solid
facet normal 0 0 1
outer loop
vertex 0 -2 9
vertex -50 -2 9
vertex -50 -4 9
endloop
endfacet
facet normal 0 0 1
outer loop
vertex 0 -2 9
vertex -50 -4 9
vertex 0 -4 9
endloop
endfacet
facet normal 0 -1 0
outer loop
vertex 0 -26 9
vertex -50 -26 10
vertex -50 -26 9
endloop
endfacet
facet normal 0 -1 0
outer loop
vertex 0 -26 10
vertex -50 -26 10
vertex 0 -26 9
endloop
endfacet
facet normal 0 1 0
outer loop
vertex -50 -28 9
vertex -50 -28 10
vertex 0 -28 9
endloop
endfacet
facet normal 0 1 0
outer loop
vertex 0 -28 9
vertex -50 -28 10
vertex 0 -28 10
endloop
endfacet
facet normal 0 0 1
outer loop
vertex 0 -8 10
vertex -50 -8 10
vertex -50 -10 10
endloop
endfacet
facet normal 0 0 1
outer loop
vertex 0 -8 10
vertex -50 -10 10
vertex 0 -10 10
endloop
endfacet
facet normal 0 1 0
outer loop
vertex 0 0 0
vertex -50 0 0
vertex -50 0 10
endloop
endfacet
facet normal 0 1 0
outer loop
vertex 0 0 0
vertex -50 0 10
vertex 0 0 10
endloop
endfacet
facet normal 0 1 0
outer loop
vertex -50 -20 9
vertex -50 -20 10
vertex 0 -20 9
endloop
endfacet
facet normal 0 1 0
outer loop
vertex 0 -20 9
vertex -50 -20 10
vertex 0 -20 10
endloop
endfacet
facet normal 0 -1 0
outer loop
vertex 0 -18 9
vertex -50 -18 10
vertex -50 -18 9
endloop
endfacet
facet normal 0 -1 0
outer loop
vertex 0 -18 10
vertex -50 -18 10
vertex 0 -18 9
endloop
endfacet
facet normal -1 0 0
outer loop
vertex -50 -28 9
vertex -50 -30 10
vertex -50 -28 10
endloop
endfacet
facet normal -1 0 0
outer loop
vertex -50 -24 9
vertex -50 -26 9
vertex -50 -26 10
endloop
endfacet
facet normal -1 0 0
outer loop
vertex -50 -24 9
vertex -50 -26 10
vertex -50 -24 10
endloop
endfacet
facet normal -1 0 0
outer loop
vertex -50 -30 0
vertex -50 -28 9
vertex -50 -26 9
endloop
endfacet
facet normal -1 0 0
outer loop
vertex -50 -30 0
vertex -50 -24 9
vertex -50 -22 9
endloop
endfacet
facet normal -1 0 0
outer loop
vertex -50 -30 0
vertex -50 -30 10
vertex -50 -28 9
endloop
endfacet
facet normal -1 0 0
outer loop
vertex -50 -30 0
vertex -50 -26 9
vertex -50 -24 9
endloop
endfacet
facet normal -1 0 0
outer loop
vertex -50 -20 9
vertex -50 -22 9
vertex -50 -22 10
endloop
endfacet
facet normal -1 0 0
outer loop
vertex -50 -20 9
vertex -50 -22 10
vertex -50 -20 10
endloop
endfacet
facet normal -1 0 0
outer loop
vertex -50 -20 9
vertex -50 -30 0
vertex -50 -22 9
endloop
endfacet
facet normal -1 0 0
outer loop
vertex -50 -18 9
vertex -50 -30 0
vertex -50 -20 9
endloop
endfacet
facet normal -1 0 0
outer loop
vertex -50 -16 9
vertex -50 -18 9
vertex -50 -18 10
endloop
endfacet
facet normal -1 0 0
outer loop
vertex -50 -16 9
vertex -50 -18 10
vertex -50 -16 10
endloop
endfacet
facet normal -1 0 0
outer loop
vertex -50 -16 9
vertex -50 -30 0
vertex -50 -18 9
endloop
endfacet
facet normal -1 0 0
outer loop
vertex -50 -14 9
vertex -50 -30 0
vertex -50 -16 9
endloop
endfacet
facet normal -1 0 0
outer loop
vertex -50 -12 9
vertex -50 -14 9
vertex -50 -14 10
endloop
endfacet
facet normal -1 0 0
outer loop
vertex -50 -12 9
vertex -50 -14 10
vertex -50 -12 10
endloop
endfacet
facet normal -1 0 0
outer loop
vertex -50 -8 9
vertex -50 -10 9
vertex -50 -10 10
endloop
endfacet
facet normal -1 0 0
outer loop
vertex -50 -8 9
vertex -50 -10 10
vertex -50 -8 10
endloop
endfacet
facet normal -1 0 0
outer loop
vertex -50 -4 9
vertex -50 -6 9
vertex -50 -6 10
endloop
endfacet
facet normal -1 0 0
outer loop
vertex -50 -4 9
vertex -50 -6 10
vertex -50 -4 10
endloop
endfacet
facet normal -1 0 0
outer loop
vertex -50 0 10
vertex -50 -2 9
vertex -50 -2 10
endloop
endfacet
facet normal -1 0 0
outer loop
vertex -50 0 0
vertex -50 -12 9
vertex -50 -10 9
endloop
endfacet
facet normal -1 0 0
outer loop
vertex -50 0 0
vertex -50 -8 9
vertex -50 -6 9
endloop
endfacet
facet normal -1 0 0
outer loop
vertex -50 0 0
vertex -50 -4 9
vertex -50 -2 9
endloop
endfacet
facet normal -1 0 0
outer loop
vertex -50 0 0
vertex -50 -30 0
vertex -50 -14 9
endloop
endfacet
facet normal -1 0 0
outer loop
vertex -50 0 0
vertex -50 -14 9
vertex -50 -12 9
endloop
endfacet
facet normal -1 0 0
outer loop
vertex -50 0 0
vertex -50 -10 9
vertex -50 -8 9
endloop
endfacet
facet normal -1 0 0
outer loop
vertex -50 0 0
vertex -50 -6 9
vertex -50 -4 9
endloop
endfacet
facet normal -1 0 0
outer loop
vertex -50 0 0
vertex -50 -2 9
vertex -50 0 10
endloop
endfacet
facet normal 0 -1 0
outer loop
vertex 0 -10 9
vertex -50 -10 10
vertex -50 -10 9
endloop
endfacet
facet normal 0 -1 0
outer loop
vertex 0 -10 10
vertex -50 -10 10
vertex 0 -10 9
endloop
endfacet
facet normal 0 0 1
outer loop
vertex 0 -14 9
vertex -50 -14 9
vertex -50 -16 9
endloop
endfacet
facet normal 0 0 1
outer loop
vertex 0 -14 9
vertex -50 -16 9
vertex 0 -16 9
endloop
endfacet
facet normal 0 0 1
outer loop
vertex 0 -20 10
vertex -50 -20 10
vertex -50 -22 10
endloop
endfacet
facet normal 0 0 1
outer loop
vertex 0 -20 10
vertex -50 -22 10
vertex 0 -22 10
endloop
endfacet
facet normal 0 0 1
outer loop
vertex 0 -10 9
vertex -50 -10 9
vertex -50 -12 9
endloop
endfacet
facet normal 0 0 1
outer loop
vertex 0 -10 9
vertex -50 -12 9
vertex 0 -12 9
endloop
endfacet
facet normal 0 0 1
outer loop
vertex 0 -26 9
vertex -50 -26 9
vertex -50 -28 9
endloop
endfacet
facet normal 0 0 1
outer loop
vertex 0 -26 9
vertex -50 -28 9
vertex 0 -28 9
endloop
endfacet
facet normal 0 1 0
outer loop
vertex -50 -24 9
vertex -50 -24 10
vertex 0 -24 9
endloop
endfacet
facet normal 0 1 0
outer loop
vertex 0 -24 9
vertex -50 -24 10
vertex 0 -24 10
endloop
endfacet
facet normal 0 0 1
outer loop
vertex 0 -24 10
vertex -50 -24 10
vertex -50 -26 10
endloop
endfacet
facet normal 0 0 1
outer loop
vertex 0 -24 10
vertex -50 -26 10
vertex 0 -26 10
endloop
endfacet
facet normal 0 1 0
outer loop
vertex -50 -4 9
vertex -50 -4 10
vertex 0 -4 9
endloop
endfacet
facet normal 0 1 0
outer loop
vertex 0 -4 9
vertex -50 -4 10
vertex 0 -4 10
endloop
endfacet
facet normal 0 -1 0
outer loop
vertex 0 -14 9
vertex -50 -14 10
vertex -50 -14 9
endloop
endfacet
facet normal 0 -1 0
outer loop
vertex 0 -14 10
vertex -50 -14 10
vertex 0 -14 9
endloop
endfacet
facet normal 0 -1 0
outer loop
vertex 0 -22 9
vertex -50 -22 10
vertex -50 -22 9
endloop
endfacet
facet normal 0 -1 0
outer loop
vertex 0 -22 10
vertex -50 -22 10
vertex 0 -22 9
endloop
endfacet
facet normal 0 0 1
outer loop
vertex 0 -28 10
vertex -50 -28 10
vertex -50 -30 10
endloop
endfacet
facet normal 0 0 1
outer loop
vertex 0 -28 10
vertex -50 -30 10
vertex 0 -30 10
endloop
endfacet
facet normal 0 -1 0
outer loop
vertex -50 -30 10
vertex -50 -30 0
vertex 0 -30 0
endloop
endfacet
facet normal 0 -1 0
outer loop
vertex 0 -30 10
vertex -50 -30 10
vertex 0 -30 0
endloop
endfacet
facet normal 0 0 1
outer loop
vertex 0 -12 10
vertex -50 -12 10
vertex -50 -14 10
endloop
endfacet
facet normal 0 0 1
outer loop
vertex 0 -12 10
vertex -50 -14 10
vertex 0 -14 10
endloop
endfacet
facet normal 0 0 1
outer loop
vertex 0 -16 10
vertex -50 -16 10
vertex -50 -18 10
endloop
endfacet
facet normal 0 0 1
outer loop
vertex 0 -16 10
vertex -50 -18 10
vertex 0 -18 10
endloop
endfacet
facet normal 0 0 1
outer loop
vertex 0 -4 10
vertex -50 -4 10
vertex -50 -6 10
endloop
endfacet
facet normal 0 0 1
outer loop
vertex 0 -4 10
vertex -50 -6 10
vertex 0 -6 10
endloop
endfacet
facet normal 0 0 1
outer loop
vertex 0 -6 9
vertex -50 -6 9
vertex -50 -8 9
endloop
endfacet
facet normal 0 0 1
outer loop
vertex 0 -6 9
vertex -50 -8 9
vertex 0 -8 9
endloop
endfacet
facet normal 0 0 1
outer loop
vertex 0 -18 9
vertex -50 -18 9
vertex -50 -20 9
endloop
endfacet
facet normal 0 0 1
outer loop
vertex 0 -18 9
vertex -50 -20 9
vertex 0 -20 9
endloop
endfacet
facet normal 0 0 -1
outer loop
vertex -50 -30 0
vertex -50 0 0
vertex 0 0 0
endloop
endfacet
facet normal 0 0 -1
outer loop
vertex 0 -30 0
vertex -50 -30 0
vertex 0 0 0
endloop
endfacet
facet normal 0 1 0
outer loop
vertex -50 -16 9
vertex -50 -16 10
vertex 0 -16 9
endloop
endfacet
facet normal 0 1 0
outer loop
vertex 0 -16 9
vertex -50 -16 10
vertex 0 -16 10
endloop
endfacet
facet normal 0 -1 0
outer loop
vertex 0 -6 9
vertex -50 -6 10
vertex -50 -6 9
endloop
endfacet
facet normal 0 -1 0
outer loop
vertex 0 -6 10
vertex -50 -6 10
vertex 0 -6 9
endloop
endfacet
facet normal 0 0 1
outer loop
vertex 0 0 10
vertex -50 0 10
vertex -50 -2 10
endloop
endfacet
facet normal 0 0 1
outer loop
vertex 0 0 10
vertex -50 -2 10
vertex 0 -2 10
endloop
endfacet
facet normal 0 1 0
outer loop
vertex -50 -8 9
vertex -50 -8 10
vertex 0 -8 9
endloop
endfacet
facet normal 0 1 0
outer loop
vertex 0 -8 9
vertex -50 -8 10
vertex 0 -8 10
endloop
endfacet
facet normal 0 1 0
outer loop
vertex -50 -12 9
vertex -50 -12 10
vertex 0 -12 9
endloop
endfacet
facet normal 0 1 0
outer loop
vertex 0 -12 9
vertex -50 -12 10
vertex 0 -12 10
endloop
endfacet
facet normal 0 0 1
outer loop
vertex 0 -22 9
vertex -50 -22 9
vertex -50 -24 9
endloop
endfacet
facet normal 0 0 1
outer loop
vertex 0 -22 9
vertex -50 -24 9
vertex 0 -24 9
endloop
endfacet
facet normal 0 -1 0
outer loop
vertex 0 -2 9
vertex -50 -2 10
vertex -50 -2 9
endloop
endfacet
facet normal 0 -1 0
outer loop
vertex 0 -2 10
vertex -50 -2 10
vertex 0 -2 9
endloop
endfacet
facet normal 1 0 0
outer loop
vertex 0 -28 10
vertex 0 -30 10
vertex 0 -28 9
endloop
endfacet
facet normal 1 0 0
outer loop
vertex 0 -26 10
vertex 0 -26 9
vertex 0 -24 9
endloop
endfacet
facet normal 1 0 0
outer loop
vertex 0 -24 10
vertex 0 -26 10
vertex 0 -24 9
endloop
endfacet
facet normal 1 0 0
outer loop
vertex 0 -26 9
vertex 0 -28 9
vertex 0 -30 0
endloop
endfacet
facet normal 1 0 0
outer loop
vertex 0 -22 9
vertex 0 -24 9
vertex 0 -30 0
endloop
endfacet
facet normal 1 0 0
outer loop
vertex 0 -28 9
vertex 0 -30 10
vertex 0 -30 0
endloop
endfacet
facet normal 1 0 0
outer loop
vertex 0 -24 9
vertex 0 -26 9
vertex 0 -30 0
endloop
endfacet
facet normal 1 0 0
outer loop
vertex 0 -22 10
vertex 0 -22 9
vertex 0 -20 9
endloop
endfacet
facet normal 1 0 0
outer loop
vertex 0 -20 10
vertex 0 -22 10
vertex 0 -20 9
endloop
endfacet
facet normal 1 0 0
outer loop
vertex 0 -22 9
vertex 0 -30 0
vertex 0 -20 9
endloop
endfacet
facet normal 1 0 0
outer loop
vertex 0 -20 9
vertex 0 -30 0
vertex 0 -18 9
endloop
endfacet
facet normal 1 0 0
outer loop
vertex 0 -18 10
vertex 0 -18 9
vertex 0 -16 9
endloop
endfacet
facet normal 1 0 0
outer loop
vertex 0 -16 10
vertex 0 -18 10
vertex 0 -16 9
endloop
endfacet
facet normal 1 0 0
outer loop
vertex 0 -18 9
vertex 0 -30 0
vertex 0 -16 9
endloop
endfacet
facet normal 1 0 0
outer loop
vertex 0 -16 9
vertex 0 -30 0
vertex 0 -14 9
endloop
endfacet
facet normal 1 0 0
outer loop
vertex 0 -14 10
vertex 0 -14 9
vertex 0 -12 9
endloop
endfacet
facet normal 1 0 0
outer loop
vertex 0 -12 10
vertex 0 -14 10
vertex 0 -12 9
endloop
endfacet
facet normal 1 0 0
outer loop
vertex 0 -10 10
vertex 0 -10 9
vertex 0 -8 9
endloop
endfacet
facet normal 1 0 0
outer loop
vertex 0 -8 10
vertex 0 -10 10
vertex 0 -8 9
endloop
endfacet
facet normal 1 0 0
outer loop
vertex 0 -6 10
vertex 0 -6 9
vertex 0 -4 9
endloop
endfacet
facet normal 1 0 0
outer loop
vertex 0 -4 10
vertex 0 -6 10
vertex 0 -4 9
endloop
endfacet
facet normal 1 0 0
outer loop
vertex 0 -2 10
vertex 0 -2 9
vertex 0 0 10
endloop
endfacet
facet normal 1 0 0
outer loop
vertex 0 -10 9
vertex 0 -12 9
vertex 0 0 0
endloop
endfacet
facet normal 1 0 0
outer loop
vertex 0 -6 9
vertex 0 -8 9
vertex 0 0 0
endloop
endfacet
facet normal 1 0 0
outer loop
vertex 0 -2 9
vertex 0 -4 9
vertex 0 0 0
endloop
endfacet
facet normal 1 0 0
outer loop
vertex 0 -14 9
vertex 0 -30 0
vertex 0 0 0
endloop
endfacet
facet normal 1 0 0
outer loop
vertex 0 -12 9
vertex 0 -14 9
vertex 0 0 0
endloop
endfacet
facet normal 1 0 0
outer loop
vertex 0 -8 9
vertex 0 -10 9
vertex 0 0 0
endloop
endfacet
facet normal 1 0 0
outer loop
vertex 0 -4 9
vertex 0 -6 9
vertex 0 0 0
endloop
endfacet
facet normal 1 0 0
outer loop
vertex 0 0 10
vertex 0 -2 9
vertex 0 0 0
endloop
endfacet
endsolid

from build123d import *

# Parameters (mm, degrees)
SKETCH1_W           = 50
SKETCH1_H           = 30
BOSS_EXTRUDE1_DEPTH = 10
SKETCH2_W           = 50
SKETCH2_H           = 2
CUT_EXTRUDE3_DEPTH  = 1


with BuildPart() as part:
    # Sketch1 → Boss-Extrude1 (new body)
    with BuildSketch(Plane.XY):
        with Locations((-25, -15)):
            Rectangle(SKETCH1_W, SKETCH1_H)
    extrude(amount=BOSS_EXTRUDE1_DEPTH)

    # Sketch2 → Cut-Extrude3 (cut)
    with BuildSketch(Plane.XY.offset(10)):
        with Locations((-25, -3)):
            Rectangle(SKETCH2_W, SKETCH2_H)
        with Locations((-25, -7)):
            Rectangle(SKETCH2_W, SKETCH2_H)
        with Locations((-25, -11)):
            Rectangle(SKETCH2_W, SKETCH2_H)
        with Locations((-25, -15)):
            Rectangle(SKETCH2_W, SKETCH2_H)
        with Locations((-25, -19)):
            Rectangle(SKETCH2_W, SKETCH2_H)
        with Locations((-25, -23)):
            Rectangle(SKETCH2_W, SKETCH2_H)
        with Locations((-25, -27)):
            Rectangle(SKETCH2_W, SKETCH2_H)
    extrude(amount=-CUT_EXTRUDE3_DEPTH, mode=Mode.SUBTRACT)


solid = part.part
